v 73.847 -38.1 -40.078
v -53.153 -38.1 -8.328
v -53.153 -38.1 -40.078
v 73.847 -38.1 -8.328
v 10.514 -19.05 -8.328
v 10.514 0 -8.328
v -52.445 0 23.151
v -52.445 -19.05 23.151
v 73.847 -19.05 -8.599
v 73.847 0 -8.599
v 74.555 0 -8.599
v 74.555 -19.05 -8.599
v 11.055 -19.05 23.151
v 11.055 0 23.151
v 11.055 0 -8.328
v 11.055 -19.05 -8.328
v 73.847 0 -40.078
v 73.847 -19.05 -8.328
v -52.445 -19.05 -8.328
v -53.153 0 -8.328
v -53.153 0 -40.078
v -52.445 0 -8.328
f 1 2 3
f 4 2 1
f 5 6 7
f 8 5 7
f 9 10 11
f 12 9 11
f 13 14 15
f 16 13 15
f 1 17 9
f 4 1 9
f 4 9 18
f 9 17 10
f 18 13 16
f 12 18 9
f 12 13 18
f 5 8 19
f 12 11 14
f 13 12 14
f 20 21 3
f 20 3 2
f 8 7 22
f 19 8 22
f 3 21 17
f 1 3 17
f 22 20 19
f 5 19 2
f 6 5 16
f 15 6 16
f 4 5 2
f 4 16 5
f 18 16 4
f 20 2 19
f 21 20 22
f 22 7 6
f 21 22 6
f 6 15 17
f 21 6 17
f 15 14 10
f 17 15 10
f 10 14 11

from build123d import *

# Parameters (mm, degrees)
F0_W     = 127
F0_H     = 31.75
F1_DEPTH = 38.1
F3_DEPTH = 19.05


with BuildPart() as f1:
    # F0 (on Front) → F1 (new body)
    with BuildSketch(Plane.XZ):
        with Locations((10.347378, -24.202869)):
            Rectangle(F0_W, F0_H)
    extrude(amount=F1_DEPTH)

    # F2 (on Front) → F3 (join)
    with BuildSketch(Plane.XZ):
        Polygon((-52.444755, 23.151476), (-52.444755, -8.598524), (11.055245, -8.598524), align=None)
        Polygon((11.055245, 23.151476), (11.055245, -8.598524), (74.555245, -8.598524), align=None)
    extrude(amount=F3_DEPTH)


solid = f1.part
